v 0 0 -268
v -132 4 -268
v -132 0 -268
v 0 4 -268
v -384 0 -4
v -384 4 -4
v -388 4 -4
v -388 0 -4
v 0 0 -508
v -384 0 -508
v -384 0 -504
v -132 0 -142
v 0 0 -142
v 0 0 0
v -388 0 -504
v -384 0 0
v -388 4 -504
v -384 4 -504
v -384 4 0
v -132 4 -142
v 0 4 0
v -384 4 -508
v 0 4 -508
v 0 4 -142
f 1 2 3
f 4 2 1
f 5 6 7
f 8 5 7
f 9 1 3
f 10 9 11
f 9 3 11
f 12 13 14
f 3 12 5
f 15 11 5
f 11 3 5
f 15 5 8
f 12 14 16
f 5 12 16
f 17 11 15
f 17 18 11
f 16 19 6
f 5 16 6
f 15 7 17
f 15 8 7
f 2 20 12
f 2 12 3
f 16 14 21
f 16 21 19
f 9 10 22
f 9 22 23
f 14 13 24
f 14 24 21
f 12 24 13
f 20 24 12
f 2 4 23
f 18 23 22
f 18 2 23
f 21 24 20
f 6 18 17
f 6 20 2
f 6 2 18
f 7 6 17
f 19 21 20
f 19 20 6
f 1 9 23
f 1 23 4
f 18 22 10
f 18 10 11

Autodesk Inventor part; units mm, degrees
ref_plane "YZ Plane" through (0, 0, 0) normal (1, 0, 0) x (0, 1, 0)
ref_plane "XZ Plane" through (0, 0, 0) normal (0, 1, 0) x (-1, 0, 0)
ref_plane "XY Plane" through (0, 0, 0) normal (0, 0, 1) x (1, 0, 0)
sketch "Эскиз1" plane through (0, 0, 0) normal (0, 1, 0) x (-1, 0, 0)
  line L0 (0, 0) -> (388, 0)
  line L1 (388, 0) -> (388, -508)
  line L2 (388, -508) -> (0, -508)
  line L3 (0, -508) -> (0, 0)
  dimension "d0" = 388
  dimension "d1" = 508
extrude "Выдавливание1" add sketch "Эскиз1" along normal blind 4
sketch "Эскиз2" plane through (0, 4, 0) normal (0, 1, 0) x (1, 0, 0)
  line L0 (0, 0) -> (0, 508) projected
  line L1 (0, 142) -> (-132, 142)
  line L2 (-132, 142) -> (-132, 268)
  line L3 (-132, 268) -> (0, 268)
  line L4 (0, 268) -> (0, 142)
  line L5 (-388, 0) -> (0, 0) projected
  point P0 (0, 268)
  dimension "d4" = 132
  dimension "d5" = 126
  dimension "d6" = 142
extrude "Выдавливание2" cut sketch "Эскиз2" against normal blind 4
sketch "Эскиз3" plane through (0, 4, 0) normal (0, 1, 0) x (1, 0, 0)
  line L0 (-388, 0) -> (0, 0) projected
  line L1 (-388, 0) -> (-384, 0)
  line L2 (-384, 0) -> (-384, 4)
  line L3 (-384, 4) -> (-388, 4)
  line L4 (-388, 4) -> (-388, 0)
  line L5 (-388, 508) -> (-388, 0) projected
  line L6 (-388, 508) -> (-384, 508)
  line L7 (-384, 508) -> (-384, 504)
  line L8 (-384, 504) -> (-388, 504)
  line L9 (-388, 504) -> (-388, 508)
  dimension "d9" = 4
  dimension "d10" = 4
  dimension "d11" = 4
  dimension "d12" = 4
extrude "Выдавливание3" cut sketch "Эскиз3" against normal blind 4
properties part number "MountingWallSide"
